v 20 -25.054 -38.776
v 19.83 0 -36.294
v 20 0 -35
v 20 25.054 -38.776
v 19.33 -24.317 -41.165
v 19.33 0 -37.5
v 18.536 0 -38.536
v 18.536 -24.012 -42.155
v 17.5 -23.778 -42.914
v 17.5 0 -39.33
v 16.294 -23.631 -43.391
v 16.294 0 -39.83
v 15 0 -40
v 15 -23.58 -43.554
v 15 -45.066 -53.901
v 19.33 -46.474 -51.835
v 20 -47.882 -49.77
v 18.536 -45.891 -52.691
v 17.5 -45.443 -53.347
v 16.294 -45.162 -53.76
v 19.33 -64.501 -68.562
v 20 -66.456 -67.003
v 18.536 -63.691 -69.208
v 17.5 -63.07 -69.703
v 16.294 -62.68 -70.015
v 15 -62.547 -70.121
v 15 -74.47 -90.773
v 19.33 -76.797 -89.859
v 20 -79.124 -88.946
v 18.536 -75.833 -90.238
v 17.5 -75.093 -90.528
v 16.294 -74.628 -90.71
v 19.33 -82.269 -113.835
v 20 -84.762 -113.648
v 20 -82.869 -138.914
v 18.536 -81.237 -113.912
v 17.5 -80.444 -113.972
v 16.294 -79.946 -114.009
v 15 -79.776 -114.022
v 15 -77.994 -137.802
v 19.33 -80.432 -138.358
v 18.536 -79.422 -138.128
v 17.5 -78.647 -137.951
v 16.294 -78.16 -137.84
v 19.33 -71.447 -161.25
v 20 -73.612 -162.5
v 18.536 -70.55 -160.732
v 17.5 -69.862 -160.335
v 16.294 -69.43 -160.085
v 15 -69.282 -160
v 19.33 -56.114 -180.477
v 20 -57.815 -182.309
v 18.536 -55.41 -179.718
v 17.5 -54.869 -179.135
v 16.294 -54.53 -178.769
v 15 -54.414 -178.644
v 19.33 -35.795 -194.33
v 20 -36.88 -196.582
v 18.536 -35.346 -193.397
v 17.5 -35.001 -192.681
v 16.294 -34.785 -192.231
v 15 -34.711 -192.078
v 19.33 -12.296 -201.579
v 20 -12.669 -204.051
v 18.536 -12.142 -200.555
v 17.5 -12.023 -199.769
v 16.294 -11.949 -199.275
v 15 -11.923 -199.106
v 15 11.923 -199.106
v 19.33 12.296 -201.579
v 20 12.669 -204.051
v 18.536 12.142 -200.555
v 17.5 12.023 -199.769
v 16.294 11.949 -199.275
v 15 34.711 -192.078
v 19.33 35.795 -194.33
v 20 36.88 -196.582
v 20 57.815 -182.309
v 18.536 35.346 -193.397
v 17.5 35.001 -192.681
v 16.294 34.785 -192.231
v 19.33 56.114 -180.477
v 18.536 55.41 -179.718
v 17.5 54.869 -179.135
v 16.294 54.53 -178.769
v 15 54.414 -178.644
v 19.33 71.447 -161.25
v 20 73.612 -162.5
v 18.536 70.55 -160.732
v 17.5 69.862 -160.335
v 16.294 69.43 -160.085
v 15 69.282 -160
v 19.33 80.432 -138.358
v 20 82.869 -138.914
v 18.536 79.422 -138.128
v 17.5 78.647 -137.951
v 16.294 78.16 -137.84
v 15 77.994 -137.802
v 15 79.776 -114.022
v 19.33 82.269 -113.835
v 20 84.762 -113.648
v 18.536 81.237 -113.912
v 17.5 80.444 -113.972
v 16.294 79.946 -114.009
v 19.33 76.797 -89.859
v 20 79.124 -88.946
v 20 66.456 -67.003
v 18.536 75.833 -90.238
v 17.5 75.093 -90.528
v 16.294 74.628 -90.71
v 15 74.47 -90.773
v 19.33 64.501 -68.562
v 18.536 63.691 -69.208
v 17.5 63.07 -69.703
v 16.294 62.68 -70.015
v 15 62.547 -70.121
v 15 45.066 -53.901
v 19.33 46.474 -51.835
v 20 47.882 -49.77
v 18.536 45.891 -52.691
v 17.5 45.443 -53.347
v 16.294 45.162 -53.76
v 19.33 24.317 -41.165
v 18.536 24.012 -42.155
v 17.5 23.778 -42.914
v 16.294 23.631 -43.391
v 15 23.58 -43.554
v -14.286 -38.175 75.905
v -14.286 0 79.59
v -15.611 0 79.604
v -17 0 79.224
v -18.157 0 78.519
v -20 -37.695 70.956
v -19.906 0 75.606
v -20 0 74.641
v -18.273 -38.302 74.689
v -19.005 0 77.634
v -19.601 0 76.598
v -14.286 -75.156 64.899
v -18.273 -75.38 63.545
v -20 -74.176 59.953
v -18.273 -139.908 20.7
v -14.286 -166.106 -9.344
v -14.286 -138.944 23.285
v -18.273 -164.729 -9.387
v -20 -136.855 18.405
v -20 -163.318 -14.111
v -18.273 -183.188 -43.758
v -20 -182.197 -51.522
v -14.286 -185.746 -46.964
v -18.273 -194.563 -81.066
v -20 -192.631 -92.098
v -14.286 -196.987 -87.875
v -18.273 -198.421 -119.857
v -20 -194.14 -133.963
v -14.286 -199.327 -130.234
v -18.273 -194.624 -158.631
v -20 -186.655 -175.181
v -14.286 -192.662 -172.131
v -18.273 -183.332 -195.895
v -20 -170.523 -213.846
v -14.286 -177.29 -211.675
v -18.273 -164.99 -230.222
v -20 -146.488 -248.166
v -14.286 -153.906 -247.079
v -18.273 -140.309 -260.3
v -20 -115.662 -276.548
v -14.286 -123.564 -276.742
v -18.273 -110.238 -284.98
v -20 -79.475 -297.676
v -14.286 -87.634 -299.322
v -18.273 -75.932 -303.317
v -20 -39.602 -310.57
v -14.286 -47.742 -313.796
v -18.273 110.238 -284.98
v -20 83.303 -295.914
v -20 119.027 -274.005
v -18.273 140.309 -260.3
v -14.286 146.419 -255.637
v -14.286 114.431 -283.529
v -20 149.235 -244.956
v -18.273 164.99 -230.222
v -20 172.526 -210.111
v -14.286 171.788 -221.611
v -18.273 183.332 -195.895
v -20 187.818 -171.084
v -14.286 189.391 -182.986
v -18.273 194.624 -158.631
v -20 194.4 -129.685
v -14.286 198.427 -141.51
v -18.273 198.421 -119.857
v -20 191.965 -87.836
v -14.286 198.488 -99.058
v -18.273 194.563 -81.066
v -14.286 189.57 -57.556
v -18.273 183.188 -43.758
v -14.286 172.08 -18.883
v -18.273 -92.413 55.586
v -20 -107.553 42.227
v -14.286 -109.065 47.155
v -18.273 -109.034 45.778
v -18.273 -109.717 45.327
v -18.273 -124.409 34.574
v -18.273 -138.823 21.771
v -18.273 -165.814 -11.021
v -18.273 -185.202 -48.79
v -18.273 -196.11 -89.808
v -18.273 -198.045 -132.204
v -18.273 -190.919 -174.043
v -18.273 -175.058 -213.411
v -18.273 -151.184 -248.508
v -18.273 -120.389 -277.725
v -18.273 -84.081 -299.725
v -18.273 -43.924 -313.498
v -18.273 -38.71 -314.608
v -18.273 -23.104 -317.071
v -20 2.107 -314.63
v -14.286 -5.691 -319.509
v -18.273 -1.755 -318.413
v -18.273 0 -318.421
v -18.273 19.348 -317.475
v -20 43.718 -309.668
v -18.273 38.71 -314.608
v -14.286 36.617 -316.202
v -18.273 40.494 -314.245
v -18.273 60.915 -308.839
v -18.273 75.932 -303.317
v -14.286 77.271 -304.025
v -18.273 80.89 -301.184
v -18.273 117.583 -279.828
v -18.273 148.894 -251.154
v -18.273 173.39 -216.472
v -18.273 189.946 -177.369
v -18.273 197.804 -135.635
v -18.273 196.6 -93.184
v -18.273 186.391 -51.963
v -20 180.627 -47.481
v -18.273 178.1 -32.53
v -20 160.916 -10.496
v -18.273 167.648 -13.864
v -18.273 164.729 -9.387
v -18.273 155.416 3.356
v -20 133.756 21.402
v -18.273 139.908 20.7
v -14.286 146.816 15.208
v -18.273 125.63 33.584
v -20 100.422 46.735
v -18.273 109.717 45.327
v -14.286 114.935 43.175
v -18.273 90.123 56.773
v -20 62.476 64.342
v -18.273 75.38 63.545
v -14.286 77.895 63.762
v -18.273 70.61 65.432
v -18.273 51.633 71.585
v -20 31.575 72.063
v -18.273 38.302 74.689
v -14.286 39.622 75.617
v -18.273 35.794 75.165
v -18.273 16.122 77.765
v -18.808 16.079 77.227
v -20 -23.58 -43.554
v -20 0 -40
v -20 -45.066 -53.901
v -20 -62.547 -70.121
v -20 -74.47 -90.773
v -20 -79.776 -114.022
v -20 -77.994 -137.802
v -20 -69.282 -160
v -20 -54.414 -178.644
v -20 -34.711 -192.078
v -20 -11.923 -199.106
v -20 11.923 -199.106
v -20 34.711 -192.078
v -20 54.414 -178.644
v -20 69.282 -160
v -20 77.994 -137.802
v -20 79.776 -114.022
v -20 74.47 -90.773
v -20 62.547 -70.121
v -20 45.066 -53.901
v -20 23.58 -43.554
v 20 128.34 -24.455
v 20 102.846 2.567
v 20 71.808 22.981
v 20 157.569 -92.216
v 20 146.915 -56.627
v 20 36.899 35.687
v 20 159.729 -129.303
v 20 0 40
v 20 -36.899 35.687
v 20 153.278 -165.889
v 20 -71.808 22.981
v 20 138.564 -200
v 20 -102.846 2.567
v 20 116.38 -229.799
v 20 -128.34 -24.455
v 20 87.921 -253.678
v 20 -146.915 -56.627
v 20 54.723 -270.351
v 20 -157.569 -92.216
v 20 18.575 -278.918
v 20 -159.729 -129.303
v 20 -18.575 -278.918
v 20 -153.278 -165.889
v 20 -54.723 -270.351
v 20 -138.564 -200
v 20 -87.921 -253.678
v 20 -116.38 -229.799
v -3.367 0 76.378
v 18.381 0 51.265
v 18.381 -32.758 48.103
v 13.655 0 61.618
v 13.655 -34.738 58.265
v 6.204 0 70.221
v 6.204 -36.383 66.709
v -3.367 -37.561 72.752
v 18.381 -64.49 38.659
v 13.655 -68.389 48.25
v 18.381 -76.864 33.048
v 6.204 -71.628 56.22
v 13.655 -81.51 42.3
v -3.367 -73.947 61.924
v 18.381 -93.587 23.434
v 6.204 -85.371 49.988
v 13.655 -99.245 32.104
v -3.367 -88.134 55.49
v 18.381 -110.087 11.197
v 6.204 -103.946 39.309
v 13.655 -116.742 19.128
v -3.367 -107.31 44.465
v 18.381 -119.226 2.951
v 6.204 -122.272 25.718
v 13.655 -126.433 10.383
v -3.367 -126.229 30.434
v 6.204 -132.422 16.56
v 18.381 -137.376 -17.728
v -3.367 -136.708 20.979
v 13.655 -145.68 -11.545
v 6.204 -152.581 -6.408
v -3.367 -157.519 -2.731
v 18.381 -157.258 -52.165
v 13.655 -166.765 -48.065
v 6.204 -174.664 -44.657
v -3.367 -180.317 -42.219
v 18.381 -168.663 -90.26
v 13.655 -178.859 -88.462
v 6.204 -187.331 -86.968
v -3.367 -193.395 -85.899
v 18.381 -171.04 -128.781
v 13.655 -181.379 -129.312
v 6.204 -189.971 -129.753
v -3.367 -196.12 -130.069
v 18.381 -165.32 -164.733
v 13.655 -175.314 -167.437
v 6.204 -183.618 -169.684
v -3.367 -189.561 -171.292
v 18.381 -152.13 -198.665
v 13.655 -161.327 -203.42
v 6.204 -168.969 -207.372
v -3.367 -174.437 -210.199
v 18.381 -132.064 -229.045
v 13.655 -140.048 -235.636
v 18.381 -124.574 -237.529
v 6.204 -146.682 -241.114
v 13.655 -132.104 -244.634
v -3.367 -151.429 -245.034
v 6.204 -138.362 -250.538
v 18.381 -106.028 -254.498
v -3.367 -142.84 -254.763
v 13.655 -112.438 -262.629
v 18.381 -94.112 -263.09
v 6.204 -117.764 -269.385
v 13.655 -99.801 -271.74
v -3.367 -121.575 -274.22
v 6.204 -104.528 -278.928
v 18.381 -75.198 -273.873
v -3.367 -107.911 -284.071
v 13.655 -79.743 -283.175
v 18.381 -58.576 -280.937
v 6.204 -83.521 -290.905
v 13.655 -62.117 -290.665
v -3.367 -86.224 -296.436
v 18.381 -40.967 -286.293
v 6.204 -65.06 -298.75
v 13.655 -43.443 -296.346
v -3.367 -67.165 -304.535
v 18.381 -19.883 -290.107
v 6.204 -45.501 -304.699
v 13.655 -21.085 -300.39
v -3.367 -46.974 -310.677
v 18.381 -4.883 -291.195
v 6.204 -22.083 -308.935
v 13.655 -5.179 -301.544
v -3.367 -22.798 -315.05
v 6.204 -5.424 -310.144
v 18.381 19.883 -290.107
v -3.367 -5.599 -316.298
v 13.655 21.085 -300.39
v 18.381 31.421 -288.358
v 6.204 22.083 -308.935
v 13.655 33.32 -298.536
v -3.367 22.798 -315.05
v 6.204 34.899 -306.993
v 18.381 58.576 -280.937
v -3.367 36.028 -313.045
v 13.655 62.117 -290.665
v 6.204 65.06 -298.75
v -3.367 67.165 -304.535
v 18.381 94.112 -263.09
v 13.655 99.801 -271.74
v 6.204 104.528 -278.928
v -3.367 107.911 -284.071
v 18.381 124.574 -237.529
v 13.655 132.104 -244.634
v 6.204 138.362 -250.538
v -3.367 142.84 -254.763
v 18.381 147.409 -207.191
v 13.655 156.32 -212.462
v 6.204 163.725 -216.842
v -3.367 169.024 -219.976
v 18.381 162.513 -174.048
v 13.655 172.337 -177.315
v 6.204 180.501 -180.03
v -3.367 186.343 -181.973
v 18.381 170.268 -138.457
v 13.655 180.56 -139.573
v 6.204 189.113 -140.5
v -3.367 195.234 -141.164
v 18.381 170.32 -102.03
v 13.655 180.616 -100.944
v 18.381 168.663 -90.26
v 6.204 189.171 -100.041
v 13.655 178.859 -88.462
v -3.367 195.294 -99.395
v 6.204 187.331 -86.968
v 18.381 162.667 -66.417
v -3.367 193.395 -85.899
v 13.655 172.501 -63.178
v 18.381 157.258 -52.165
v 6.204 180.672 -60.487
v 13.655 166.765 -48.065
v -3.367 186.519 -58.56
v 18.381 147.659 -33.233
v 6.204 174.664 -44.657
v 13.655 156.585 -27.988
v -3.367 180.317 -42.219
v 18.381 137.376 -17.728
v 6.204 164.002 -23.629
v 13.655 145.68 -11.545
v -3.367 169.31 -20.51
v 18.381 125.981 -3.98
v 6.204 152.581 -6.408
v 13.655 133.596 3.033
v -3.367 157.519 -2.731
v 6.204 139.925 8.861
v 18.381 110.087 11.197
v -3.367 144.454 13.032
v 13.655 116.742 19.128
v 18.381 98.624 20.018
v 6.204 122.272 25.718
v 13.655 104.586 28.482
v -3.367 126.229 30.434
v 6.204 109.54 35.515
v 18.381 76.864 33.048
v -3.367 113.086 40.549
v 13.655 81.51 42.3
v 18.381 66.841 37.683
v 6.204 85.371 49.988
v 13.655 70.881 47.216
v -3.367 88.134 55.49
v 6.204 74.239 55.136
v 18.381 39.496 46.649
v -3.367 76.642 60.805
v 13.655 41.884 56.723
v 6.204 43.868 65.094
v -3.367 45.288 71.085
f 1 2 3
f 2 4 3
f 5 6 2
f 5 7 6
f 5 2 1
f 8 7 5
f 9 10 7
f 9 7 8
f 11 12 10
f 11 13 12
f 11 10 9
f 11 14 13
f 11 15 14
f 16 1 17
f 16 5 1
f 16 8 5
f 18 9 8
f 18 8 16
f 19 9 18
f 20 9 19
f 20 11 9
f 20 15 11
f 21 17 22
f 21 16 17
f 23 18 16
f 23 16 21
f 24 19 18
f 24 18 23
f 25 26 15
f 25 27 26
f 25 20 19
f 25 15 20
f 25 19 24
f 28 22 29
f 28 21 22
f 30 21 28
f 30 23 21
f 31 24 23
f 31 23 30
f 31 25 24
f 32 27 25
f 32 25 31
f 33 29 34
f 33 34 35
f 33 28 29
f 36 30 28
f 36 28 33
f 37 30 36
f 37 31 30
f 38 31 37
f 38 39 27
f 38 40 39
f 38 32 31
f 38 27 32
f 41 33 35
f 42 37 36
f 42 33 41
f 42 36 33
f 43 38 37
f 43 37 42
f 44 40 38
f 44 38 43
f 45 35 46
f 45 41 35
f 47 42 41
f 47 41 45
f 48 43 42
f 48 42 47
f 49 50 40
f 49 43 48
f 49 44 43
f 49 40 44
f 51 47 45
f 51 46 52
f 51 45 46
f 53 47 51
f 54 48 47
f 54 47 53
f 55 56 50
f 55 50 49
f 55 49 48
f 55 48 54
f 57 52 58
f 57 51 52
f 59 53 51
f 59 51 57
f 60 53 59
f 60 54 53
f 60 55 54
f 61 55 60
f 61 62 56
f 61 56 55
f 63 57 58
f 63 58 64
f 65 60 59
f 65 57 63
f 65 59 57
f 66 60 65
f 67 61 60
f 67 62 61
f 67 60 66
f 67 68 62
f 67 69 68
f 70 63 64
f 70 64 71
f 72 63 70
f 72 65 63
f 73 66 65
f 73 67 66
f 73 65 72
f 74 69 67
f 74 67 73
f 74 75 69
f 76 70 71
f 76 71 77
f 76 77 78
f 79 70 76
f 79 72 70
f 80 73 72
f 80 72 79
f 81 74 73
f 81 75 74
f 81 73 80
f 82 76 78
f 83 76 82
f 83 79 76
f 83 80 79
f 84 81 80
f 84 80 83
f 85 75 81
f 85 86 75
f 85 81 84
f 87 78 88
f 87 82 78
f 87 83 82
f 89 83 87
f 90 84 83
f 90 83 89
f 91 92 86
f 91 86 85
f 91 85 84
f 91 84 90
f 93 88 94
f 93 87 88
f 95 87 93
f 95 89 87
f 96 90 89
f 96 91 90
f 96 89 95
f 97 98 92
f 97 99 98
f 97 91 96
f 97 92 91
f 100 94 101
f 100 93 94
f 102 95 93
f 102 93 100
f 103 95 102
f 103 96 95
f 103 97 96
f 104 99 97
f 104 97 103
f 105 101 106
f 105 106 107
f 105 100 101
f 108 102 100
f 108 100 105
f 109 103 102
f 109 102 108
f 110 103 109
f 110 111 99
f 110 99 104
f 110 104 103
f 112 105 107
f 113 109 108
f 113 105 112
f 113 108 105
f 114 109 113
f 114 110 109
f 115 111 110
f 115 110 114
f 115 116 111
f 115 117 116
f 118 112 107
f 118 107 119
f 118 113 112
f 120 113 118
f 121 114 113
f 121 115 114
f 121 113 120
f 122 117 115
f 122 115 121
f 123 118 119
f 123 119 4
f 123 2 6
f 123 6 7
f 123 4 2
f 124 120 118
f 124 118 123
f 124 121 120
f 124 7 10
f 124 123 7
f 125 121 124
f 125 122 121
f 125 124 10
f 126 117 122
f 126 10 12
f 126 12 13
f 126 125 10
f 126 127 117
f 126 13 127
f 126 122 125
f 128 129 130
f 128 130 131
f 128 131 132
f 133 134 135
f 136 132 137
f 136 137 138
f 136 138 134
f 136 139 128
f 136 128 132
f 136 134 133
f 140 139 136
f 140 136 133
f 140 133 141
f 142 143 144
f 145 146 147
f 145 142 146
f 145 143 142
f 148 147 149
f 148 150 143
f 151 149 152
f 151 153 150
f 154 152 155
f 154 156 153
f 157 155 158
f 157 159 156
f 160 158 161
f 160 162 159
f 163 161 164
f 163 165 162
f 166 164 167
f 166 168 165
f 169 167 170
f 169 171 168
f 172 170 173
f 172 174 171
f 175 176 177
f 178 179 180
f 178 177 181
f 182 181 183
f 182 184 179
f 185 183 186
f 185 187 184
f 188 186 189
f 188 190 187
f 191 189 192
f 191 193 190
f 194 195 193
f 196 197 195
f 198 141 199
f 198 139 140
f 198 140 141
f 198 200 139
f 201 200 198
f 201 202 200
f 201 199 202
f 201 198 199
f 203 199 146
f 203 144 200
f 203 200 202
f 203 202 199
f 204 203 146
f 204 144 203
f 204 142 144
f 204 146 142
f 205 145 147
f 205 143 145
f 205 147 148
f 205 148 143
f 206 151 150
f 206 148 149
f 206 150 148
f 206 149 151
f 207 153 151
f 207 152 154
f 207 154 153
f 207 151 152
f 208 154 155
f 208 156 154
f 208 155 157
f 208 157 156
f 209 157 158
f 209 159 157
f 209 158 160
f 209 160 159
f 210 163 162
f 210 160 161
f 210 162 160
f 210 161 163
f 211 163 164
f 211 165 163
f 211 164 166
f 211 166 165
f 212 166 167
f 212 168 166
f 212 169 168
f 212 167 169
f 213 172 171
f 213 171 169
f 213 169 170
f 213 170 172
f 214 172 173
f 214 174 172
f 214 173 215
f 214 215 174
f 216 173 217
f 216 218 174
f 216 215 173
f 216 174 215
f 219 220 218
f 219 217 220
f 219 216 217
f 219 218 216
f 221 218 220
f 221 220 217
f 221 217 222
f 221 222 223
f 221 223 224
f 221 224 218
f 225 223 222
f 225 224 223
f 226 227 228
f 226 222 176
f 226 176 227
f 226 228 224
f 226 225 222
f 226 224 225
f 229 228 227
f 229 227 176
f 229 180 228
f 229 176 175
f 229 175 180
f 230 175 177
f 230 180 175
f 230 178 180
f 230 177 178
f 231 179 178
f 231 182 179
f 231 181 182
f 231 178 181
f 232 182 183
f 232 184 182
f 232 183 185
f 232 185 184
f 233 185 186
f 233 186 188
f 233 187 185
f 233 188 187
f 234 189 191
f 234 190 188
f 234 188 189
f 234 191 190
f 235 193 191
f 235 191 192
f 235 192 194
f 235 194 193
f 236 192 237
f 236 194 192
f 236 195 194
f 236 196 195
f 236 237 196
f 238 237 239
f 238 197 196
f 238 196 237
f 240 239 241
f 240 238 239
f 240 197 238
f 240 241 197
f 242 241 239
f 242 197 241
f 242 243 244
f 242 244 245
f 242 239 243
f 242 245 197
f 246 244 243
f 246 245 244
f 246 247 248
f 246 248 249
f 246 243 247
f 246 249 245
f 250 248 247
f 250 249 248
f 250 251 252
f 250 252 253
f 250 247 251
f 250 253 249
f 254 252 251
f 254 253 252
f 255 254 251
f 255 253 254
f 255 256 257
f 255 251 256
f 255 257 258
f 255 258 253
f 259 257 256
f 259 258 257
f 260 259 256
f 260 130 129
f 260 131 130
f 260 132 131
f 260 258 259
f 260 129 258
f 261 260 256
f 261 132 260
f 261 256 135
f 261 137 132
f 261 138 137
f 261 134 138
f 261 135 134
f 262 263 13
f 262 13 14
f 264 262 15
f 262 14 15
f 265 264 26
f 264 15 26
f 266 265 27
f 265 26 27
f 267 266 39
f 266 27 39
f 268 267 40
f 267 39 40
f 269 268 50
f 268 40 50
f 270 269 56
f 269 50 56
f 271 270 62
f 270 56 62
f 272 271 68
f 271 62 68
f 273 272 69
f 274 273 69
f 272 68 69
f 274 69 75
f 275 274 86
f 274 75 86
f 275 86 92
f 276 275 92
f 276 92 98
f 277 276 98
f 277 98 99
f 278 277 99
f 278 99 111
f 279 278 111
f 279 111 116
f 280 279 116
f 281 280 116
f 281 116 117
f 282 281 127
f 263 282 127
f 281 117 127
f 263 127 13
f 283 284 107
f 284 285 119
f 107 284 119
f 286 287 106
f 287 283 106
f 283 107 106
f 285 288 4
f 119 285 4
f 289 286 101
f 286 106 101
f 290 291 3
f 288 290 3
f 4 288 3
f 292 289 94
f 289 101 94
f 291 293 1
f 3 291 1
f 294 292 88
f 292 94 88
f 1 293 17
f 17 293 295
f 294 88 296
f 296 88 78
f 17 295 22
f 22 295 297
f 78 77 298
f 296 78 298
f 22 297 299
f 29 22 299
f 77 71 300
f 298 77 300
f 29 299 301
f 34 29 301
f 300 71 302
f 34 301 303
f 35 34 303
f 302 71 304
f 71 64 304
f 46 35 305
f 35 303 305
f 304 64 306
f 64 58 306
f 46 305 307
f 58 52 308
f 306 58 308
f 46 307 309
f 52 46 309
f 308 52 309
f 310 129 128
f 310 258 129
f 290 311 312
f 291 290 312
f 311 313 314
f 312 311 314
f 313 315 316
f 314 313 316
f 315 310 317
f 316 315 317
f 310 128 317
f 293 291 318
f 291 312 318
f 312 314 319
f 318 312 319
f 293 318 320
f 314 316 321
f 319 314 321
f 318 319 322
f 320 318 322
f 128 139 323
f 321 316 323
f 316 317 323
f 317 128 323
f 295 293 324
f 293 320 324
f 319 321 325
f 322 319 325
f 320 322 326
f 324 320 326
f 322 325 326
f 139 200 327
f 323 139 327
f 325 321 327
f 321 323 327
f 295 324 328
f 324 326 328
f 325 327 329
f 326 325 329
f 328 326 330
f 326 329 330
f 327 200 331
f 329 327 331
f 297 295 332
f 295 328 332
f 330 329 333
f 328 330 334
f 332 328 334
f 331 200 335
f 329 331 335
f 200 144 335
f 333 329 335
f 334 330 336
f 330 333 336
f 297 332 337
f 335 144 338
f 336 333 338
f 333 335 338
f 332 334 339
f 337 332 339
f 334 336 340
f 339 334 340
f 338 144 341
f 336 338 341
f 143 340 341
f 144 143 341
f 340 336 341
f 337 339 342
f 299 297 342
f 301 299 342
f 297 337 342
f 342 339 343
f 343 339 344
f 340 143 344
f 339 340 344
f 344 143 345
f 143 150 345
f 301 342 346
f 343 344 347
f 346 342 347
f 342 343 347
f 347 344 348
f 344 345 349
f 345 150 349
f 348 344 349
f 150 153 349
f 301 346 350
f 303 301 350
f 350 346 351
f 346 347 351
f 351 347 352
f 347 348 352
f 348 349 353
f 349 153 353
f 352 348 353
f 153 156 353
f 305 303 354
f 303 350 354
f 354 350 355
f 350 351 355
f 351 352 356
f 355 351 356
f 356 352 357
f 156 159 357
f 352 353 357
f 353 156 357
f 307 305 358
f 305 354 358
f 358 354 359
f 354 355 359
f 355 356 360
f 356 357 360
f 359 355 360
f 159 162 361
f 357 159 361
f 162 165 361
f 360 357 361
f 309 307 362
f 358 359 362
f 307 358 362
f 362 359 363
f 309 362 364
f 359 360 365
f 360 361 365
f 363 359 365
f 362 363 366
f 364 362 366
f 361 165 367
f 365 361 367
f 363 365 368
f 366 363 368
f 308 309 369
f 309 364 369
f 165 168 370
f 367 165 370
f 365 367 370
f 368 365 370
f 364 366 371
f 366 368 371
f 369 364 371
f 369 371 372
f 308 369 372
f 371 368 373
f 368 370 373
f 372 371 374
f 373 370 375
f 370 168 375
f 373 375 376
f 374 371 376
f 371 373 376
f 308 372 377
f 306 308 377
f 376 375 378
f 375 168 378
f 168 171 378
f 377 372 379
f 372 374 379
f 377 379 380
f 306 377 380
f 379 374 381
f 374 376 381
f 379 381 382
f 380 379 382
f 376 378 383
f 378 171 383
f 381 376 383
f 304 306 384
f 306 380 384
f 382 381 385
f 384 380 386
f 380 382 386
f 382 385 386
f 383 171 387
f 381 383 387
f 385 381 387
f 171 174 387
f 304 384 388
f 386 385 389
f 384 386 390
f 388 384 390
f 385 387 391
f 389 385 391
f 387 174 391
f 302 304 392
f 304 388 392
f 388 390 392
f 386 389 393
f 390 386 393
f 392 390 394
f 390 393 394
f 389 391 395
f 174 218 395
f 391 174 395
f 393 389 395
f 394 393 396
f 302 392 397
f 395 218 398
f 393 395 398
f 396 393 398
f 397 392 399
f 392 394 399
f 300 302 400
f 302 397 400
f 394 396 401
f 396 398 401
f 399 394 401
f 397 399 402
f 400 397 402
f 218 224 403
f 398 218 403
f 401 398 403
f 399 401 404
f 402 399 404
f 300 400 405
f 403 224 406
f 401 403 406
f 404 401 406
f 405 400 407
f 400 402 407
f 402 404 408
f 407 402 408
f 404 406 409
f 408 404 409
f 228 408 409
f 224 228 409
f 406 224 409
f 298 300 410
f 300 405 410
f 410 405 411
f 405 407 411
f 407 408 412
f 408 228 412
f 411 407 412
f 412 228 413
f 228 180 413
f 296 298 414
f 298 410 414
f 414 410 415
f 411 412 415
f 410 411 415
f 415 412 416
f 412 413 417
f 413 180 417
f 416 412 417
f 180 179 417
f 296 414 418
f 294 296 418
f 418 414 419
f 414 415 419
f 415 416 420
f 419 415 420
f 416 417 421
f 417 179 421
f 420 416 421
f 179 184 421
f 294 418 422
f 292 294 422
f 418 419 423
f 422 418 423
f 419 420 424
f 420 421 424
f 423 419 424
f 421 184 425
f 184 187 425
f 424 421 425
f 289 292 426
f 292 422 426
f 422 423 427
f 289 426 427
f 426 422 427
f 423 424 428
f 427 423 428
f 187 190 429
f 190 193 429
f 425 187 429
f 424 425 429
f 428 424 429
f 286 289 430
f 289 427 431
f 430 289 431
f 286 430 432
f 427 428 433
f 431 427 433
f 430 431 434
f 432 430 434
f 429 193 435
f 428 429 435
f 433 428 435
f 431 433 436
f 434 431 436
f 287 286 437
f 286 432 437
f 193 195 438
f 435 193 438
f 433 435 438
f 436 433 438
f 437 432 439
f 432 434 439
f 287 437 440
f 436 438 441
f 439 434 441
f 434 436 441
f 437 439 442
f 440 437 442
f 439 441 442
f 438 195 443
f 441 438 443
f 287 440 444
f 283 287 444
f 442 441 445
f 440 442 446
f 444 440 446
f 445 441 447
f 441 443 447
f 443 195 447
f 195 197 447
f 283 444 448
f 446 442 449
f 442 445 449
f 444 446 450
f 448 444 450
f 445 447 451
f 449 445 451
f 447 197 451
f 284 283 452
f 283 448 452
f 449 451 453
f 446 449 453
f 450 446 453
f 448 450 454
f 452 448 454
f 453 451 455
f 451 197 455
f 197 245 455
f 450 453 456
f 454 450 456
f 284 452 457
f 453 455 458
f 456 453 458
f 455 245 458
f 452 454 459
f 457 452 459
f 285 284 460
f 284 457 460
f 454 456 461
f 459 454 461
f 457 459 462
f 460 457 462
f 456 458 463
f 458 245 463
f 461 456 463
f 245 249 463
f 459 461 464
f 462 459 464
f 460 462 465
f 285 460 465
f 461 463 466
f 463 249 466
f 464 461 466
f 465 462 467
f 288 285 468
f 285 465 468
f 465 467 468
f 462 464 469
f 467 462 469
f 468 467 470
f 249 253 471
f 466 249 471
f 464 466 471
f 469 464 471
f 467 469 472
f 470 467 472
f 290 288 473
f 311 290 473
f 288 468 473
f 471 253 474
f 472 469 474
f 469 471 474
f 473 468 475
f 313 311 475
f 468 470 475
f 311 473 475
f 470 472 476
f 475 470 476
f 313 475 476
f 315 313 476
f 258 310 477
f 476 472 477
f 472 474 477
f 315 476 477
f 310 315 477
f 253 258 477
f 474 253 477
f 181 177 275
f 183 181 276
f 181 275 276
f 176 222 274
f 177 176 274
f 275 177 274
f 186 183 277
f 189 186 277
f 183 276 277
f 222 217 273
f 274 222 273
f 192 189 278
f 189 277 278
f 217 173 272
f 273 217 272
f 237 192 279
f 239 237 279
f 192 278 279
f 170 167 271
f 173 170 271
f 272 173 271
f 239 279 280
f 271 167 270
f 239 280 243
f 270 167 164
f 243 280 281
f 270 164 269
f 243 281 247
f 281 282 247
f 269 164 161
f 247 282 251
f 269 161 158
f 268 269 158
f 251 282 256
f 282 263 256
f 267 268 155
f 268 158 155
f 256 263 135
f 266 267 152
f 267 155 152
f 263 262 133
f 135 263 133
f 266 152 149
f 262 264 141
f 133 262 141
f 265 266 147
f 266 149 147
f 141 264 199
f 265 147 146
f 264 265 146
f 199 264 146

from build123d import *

# Parameters (mm, degrees)
F2_R = 5
F3_R = 5


with BuildPart() as f1:
    # F0 (on Front) → F1 (revolve)
    with BuildSketch(Plane.XZ):
        with BuildLine():
            Line((-20, 40), (-20, -40))
            Line((-20, -40), (20, -40))
            Line((20, -40), (20, 40))
            ThreePointArc((20, 40), (8.2842712475, 68.2842712475), (-20, 80))
            Line((-20, 80), (-20, 40))
        make_face()
    revolve(axis=Axis((15.3097613019, 0, -120), (1, 0, 0)))

    # F2
    f2_edges = [f1.edges().sort_by_distance(p)[0] for p in [
        (-20, 0, -320),
    ]]
    fillet(f2_edges, radius=F2_R)

    # F3
    f3_edges = [f1.edges().sort_by_distance(p)[0] for p in [
        (20, 0, -200),
    ]]
    fillet(f3_edges, radius=F3_R)


solid = f1.part
